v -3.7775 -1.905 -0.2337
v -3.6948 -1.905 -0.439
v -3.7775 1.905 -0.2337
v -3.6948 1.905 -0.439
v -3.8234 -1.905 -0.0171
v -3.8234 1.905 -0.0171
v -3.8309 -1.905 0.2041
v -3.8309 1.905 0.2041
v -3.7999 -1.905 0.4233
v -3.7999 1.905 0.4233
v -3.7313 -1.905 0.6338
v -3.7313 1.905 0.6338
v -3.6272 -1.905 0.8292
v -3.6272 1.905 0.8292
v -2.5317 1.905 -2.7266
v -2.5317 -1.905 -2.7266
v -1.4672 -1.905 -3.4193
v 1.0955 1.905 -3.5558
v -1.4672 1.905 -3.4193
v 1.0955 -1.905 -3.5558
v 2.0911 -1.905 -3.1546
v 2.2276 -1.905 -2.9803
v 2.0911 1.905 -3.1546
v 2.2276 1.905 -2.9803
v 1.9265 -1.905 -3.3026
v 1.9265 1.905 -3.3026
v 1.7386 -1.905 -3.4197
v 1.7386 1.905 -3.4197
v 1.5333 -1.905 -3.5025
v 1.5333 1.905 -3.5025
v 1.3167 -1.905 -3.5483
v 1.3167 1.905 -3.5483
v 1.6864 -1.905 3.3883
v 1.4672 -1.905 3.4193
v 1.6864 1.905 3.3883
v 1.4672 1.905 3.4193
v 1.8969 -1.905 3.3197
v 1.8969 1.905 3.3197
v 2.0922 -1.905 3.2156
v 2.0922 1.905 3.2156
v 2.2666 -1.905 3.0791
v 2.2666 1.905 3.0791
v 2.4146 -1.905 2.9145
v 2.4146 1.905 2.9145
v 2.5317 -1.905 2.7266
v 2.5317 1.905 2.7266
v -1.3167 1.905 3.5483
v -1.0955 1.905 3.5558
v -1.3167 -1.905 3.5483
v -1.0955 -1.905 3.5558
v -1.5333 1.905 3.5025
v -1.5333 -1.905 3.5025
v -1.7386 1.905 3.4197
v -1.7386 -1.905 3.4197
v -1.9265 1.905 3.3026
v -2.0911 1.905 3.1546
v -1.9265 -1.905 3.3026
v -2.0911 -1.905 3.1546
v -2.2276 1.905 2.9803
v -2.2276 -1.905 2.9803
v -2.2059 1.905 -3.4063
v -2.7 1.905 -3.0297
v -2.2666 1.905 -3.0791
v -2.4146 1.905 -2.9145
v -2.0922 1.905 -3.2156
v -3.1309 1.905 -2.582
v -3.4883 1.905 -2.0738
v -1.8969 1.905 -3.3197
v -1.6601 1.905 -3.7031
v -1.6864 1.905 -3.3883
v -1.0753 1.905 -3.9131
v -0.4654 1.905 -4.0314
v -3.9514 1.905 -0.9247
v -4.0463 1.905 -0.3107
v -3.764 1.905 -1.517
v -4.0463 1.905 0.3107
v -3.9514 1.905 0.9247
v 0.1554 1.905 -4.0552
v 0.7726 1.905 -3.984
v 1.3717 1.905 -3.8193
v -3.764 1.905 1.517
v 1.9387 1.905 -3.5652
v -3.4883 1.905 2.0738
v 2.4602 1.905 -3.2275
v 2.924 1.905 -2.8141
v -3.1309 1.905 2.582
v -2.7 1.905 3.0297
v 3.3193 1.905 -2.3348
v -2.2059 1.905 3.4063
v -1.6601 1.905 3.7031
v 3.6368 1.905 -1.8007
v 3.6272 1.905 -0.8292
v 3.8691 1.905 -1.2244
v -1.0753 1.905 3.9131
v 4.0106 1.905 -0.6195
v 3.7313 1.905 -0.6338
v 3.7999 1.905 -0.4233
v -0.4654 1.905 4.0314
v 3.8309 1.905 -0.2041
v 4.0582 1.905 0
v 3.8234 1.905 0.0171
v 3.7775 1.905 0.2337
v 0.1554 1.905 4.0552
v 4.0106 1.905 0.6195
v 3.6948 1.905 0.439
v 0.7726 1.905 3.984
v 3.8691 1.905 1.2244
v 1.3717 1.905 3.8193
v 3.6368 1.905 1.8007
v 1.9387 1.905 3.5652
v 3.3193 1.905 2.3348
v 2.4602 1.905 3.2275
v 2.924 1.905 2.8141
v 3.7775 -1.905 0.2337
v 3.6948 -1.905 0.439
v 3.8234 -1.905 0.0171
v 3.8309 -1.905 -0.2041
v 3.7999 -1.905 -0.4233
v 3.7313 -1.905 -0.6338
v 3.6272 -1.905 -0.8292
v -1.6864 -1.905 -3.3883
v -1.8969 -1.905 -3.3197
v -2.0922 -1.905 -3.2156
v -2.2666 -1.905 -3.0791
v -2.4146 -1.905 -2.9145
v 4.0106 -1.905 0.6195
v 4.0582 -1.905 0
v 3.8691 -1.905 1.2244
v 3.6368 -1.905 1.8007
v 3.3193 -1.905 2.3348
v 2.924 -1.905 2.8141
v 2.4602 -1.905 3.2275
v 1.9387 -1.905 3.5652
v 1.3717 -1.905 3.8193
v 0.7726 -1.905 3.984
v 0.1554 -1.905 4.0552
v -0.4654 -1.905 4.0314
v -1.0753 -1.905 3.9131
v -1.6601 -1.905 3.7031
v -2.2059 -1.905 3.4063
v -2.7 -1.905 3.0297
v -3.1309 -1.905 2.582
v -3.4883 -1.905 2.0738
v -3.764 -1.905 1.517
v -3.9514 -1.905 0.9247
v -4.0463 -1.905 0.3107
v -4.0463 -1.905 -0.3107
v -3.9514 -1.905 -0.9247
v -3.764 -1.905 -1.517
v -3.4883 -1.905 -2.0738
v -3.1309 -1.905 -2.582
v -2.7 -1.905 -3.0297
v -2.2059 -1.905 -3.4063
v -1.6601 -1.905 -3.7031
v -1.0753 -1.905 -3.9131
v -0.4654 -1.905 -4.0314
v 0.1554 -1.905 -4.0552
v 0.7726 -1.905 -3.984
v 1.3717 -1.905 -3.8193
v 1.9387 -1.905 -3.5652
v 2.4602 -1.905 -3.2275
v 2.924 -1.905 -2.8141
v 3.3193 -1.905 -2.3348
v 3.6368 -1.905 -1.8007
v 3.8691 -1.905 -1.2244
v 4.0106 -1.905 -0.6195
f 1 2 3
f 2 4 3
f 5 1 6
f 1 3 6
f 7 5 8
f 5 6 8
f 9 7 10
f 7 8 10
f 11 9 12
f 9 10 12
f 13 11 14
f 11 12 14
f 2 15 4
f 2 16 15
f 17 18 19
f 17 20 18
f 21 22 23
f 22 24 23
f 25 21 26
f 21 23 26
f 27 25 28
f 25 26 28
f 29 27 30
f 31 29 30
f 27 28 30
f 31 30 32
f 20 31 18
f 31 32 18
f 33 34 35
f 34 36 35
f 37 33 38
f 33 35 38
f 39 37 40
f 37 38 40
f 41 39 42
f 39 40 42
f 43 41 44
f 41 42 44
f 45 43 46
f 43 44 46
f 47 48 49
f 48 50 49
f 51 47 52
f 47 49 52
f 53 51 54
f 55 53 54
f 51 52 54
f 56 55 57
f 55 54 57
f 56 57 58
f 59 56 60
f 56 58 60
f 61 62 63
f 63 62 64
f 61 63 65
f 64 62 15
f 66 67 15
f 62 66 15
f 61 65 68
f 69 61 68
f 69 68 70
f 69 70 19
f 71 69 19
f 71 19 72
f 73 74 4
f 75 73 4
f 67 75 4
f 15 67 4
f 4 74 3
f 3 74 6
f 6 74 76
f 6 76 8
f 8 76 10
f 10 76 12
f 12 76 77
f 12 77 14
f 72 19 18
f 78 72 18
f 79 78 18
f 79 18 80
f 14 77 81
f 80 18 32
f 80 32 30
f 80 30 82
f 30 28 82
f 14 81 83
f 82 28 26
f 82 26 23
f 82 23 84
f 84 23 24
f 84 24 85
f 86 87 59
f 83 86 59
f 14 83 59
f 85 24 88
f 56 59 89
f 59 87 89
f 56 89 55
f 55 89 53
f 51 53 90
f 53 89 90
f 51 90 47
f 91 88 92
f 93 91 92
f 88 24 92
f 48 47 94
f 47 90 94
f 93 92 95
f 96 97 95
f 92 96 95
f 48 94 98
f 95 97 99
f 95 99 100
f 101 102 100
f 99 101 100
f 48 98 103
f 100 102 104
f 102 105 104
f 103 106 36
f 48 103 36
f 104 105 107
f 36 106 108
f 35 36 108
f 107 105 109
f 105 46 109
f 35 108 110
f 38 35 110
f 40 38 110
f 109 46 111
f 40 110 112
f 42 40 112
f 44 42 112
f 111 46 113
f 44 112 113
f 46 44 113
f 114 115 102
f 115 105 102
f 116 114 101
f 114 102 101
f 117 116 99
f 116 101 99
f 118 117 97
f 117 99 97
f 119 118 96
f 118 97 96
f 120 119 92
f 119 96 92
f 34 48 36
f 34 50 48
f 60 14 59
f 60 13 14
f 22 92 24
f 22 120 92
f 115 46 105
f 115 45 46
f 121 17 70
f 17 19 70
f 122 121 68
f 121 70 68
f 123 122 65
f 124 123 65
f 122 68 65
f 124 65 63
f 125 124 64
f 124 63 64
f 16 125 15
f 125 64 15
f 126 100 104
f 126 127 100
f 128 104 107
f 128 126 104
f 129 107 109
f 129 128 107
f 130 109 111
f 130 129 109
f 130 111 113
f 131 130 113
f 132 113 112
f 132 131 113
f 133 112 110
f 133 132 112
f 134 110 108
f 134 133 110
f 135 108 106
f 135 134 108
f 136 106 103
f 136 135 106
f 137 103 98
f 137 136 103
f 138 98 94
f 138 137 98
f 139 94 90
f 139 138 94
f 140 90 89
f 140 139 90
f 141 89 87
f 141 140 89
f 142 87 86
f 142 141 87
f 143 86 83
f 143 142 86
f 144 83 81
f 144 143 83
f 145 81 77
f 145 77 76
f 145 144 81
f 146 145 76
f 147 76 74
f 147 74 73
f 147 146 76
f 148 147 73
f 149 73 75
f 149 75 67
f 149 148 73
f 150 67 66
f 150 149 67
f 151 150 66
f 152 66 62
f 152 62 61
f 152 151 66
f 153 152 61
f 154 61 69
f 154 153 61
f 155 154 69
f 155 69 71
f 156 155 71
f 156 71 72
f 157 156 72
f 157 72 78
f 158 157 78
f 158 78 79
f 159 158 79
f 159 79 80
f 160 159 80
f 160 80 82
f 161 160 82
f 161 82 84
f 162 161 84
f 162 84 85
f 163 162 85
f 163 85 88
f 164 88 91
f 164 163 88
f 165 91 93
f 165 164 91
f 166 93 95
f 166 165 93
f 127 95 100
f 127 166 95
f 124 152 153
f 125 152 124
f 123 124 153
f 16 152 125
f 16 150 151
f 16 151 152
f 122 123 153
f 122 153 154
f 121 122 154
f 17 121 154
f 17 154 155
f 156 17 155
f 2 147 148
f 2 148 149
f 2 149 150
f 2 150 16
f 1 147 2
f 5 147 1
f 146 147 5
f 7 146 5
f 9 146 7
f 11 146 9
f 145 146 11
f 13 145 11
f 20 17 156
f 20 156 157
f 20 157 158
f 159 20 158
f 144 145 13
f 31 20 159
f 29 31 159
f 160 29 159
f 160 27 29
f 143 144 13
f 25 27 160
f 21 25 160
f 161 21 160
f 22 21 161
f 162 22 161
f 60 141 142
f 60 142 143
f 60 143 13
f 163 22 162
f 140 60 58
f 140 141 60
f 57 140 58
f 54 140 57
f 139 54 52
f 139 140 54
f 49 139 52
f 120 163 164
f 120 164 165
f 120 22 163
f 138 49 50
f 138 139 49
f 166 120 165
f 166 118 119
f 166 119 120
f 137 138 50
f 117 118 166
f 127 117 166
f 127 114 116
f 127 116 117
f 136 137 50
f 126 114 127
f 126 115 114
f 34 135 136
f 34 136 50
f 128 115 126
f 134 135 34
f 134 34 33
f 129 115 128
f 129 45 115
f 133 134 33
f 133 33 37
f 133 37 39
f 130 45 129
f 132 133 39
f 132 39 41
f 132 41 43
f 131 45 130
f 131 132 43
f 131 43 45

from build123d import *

# Parameters (mm, degrees)
F0_R     = 4.0581916303
F1_DEPTH = 1.905
F2_R     = 1.27


with BuildPart() as f1:
    # F0 (on Front) → F1 (new body, symmetric)
    with BuildSketch(Plane.XZ):
        Circle(F0_R)
        Polygon((-1.8276859231, 3.5948536131), (2.1993915903, 3.3802492461), (4.0270775134, -0.2146043671), (1.8276859231, -3.5948536131), (-2.1993915903, -3.3802492461), (-4.0270775134, 0.2146043671), align=None, mode=Mode.SUBTRACT)
    extrude(amount=F1_DEPTH, both=True)

    # F2
    f2_edges = [f1.edges().sort_by_distance(p)[0] for p in [
        (-1.827686, 0, 3.594854),
        (2.199392, 0, 3.380249),
        (4.027078, 0, -0.214604),
        (-4.027078, 0, 0.214604),
        (-2.199392, 0, -3.380249),
        (1.827686, 0, -3.594854),
    ]]
    fillet(f2_edges, radius=F2_R)


solid = f1.part
